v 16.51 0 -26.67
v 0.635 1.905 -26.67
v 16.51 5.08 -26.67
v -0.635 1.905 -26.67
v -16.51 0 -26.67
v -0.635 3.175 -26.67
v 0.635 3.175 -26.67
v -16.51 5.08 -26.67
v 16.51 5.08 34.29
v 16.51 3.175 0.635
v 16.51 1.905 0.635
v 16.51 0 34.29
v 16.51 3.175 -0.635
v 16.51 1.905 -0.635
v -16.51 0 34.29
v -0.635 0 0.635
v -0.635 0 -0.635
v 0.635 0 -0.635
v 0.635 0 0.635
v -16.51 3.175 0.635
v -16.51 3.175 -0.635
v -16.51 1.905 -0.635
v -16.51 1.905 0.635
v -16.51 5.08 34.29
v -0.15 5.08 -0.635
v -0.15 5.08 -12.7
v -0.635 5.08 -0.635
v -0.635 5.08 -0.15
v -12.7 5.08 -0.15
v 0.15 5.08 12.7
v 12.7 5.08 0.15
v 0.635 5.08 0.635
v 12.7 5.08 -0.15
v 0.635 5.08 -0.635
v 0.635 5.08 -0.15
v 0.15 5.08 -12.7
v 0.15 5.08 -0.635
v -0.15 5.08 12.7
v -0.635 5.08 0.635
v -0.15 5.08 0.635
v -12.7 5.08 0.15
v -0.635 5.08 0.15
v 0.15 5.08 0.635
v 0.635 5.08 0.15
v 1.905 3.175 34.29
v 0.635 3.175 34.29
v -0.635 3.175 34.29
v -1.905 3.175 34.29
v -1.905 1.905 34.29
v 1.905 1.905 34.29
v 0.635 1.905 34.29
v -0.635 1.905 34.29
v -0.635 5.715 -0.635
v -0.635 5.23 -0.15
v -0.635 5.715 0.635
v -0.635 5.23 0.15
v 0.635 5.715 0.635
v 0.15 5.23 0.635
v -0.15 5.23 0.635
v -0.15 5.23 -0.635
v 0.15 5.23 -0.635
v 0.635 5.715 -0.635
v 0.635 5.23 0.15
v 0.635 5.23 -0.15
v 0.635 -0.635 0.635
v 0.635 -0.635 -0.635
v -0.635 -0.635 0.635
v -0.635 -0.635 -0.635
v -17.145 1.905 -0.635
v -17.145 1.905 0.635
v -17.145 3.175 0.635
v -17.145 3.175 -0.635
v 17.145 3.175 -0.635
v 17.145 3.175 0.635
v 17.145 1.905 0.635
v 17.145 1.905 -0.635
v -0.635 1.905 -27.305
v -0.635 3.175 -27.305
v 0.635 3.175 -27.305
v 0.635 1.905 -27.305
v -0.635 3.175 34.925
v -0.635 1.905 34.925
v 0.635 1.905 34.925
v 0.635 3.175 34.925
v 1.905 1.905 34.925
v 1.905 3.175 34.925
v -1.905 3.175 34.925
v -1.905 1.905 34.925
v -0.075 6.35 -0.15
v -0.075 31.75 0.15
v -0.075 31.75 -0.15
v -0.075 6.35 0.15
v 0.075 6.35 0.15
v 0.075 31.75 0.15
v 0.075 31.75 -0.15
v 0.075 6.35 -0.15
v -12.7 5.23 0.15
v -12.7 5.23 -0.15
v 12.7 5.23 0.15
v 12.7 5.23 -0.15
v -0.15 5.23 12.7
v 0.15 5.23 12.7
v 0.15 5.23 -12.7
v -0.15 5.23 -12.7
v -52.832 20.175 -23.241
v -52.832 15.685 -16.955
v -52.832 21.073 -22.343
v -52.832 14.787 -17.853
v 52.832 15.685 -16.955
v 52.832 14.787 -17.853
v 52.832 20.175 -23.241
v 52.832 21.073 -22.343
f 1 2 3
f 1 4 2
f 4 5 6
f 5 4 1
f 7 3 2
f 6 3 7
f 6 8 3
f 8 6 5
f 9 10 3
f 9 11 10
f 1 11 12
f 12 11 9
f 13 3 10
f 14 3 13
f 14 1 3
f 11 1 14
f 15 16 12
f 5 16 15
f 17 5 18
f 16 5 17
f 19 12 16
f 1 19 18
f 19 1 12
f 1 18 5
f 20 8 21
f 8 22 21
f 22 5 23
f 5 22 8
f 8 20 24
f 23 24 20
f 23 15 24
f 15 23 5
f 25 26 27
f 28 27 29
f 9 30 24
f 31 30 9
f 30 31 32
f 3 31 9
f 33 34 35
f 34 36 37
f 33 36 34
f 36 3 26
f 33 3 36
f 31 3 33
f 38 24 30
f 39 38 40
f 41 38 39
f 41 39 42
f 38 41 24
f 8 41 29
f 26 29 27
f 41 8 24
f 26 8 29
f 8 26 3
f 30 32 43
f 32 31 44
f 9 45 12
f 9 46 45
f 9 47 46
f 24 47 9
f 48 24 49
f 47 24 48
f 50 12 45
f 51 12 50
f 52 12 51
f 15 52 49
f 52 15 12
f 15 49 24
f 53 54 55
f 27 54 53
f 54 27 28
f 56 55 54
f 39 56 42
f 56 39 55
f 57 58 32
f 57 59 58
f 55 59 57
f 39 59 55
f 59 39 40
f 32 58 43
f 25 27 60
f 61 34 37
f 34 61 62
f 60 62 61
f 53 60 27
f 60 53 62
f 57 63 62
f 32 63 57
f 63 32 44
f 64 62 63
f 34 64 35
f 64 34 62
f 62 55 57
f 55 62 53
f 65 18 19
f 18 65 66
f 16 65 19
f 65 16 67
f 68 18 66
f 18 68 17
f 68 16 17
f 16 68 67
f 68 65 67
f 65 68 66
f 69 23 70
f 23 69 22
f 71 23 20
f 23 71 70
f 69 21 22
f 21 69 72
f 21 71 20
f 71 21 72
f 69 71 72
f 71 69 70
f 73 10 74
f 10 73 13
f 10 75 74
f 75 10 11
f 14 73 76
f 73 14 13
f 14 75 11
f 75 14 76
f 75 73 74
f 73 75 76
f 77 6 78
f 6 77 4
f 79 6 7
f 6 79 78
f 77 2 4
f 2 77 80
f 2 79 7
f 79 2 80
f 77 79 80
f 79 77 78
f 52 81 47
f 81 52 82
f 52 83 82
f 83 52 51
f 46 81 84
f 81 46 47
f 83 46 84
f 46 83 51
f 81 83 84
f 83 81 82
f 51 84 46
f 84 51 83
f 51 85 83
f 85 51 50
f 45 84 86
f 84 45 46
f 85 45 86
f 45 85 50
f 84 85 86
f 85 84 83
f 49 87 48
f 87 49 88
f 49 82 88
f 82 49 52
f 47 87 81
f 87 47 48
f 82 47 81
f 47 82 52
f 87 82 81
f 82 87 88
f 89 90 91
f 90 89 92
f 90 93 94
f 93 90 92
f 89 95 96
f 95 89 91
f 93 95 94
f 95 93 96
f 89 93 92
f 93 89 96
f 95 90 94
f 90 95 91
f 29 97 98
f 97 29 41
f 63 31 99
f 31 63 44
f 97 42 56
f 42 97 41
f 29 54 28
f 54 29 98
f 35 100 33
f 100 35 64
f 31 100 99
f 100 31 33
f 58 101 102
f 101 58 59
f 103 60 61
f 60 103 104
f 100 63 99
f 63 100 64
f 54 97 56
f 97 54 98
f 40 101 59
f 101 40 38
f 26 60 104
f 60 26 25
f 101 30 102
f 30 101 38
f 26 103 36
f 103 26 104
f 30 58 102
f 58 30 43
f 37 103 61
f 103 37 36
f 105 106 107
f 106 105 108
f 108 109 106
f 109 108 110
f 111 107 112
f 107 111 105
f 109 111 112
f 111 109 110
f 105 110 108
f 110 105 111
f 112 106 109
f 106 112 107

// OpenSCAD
include <../mo/mo.scad>

AdaBatteryLiPo3_7V1200mAh_BodyHeight = 2.1 * in;
AdaBatteryLiPo3_7V1200mAh_PCBHeight = 0.3 * in;
AdaBatteryLiPo3_7V1200mAh_Height = AdaBatteryLiPo3_7V1200mAh_BodyHeight + AdaBatteryLiPo3_7V1200mAh_PCBHeight;
AdaBatteryLiPo3_7V1200mAh_Width = 1.3 * in;
AdaBatteryLiPo3_7V1200mAh_Depth = 0.2 * in;
AdaBatteryLiPo3_7V1200mAh_WireSpacing = 0.1 * in;

AdaBatteryLiPo3_7V1200mAh_BodyColor = Aluminum;
AdaBatteryLiPo3_7V1200mAh_PCBColor = [ 1, 1, 0 ];

positions = [ 
  [ [ 0, 0, 0 ], [ 0, 0, 1 ], 0 ],
  [ [ 0, AdaBatteryLiPo3_7V1200mAh_Depth, 0 ], [ 0, 0, 1 ], 180 ],
  [ [ AdaBatteryLiPo3_7V1200mAh_Width/2, AdaBatteryLiPo3_7V1200mAh_Depth/2, 0 ], [ 0, 0, 1 ], 90 ],  
  [ [ -AdaBatteryLiPo3_7V1200mAh_Width/2, AdaBatteryLiPo3_7V1200mAh_Depth/2, 0 ], [ 0, 0, 1 ], -90 ],  
  [ [ 0, AdaBatteryLiPo3_7V1200mAh_Depth/2, -AdaBatteryLiPo3_7V1200mAh_BodyHeight/2 ], [ 1, 0, 0 ], 90 ],  
  [ [ 0, AdaBatteryLiPo3_7V1200mAh_Depth/2, AdaBatteryLiPo3_7V1200mAh_BodyHeight/2 + AdaBatteryLiPo3_7V1200mAh_PCBHeight], [ 1, 0, 0 ], -90 ],  
  [ [ -AdaBatteryLiPo3_7V1200mAh_WireSpacing / 2, AdaBatteryLiPo3_7V1200mAh_Depth/2, AdaBatteryLiPo3_7V1200mAh_BodyHeight/2 + AdaBatteryLiPo3_7V1200mAh_PCBHeight], [ 1, 0, 0 ], -90 ],  
  [ [ AdaBatteryLiPo3_7V1200mAh_WireSpacing / 2, AdaBatteryLiPo3_7V1200mAh_Depth/2, AdaBatteryLiPo3_7V1200mAh_BodyHeight/2 + AdaBatteryLiPo3_7V1200mAh_PCBHeight], [ 1, 0, 0 ], -90 ],  
];

module adaBatteryLiPo3_7V1200mAh( p = 0, info = false ) {
    moPresent( positions, p, info ) {
        translate( [ 0, AdaBatteryLiPo3_7V1200mAh_Depth / 2, 0 ] ) {
          union() {
            color( AdaBatteryLiPo3_7V1200mAh_BodyColor ) {
              linear_extrude( height = AdaBatteryLiPo3_7V1200mAh_BodyHeight, twist = 0, center = true ) {
                square( [ AdaBatteryLiPo3_7V1200mAh_Width, AdaBatteryLiPo3_7V1200mAh_Depth ], center = true );
              }
            }
            translate( [ 0, 0, AdaBatteryLiPo3_7V1200mAh_BodyHeight / 2 ] ) {
              color( AdaBatteryLiPo3_7V1200mAh_PCBColor ) {
                linear_extrude( height = AdaBatteryLiPo3_7V1200mAh_PCBHeight, twist = 0 ) {
                  square( [ AdaBatteryLiPo3_7V1200mAh_Width, AdaBatteryLiPo3_7V1200mAh_Depth ], center = true );
                }
              }          
            }
          }
        }
    }
}


function adaBatteryLiPo3_7V1200mAhPosition( p = 0 ) = positions[ p ];

moMoveOriginTo( adaBatteryLiPo3_7V1200mAhPosition( 1 ) ) {
  adaBatteryLiPo3_7V1200mAh( 0, info = true, $name = true );
}
